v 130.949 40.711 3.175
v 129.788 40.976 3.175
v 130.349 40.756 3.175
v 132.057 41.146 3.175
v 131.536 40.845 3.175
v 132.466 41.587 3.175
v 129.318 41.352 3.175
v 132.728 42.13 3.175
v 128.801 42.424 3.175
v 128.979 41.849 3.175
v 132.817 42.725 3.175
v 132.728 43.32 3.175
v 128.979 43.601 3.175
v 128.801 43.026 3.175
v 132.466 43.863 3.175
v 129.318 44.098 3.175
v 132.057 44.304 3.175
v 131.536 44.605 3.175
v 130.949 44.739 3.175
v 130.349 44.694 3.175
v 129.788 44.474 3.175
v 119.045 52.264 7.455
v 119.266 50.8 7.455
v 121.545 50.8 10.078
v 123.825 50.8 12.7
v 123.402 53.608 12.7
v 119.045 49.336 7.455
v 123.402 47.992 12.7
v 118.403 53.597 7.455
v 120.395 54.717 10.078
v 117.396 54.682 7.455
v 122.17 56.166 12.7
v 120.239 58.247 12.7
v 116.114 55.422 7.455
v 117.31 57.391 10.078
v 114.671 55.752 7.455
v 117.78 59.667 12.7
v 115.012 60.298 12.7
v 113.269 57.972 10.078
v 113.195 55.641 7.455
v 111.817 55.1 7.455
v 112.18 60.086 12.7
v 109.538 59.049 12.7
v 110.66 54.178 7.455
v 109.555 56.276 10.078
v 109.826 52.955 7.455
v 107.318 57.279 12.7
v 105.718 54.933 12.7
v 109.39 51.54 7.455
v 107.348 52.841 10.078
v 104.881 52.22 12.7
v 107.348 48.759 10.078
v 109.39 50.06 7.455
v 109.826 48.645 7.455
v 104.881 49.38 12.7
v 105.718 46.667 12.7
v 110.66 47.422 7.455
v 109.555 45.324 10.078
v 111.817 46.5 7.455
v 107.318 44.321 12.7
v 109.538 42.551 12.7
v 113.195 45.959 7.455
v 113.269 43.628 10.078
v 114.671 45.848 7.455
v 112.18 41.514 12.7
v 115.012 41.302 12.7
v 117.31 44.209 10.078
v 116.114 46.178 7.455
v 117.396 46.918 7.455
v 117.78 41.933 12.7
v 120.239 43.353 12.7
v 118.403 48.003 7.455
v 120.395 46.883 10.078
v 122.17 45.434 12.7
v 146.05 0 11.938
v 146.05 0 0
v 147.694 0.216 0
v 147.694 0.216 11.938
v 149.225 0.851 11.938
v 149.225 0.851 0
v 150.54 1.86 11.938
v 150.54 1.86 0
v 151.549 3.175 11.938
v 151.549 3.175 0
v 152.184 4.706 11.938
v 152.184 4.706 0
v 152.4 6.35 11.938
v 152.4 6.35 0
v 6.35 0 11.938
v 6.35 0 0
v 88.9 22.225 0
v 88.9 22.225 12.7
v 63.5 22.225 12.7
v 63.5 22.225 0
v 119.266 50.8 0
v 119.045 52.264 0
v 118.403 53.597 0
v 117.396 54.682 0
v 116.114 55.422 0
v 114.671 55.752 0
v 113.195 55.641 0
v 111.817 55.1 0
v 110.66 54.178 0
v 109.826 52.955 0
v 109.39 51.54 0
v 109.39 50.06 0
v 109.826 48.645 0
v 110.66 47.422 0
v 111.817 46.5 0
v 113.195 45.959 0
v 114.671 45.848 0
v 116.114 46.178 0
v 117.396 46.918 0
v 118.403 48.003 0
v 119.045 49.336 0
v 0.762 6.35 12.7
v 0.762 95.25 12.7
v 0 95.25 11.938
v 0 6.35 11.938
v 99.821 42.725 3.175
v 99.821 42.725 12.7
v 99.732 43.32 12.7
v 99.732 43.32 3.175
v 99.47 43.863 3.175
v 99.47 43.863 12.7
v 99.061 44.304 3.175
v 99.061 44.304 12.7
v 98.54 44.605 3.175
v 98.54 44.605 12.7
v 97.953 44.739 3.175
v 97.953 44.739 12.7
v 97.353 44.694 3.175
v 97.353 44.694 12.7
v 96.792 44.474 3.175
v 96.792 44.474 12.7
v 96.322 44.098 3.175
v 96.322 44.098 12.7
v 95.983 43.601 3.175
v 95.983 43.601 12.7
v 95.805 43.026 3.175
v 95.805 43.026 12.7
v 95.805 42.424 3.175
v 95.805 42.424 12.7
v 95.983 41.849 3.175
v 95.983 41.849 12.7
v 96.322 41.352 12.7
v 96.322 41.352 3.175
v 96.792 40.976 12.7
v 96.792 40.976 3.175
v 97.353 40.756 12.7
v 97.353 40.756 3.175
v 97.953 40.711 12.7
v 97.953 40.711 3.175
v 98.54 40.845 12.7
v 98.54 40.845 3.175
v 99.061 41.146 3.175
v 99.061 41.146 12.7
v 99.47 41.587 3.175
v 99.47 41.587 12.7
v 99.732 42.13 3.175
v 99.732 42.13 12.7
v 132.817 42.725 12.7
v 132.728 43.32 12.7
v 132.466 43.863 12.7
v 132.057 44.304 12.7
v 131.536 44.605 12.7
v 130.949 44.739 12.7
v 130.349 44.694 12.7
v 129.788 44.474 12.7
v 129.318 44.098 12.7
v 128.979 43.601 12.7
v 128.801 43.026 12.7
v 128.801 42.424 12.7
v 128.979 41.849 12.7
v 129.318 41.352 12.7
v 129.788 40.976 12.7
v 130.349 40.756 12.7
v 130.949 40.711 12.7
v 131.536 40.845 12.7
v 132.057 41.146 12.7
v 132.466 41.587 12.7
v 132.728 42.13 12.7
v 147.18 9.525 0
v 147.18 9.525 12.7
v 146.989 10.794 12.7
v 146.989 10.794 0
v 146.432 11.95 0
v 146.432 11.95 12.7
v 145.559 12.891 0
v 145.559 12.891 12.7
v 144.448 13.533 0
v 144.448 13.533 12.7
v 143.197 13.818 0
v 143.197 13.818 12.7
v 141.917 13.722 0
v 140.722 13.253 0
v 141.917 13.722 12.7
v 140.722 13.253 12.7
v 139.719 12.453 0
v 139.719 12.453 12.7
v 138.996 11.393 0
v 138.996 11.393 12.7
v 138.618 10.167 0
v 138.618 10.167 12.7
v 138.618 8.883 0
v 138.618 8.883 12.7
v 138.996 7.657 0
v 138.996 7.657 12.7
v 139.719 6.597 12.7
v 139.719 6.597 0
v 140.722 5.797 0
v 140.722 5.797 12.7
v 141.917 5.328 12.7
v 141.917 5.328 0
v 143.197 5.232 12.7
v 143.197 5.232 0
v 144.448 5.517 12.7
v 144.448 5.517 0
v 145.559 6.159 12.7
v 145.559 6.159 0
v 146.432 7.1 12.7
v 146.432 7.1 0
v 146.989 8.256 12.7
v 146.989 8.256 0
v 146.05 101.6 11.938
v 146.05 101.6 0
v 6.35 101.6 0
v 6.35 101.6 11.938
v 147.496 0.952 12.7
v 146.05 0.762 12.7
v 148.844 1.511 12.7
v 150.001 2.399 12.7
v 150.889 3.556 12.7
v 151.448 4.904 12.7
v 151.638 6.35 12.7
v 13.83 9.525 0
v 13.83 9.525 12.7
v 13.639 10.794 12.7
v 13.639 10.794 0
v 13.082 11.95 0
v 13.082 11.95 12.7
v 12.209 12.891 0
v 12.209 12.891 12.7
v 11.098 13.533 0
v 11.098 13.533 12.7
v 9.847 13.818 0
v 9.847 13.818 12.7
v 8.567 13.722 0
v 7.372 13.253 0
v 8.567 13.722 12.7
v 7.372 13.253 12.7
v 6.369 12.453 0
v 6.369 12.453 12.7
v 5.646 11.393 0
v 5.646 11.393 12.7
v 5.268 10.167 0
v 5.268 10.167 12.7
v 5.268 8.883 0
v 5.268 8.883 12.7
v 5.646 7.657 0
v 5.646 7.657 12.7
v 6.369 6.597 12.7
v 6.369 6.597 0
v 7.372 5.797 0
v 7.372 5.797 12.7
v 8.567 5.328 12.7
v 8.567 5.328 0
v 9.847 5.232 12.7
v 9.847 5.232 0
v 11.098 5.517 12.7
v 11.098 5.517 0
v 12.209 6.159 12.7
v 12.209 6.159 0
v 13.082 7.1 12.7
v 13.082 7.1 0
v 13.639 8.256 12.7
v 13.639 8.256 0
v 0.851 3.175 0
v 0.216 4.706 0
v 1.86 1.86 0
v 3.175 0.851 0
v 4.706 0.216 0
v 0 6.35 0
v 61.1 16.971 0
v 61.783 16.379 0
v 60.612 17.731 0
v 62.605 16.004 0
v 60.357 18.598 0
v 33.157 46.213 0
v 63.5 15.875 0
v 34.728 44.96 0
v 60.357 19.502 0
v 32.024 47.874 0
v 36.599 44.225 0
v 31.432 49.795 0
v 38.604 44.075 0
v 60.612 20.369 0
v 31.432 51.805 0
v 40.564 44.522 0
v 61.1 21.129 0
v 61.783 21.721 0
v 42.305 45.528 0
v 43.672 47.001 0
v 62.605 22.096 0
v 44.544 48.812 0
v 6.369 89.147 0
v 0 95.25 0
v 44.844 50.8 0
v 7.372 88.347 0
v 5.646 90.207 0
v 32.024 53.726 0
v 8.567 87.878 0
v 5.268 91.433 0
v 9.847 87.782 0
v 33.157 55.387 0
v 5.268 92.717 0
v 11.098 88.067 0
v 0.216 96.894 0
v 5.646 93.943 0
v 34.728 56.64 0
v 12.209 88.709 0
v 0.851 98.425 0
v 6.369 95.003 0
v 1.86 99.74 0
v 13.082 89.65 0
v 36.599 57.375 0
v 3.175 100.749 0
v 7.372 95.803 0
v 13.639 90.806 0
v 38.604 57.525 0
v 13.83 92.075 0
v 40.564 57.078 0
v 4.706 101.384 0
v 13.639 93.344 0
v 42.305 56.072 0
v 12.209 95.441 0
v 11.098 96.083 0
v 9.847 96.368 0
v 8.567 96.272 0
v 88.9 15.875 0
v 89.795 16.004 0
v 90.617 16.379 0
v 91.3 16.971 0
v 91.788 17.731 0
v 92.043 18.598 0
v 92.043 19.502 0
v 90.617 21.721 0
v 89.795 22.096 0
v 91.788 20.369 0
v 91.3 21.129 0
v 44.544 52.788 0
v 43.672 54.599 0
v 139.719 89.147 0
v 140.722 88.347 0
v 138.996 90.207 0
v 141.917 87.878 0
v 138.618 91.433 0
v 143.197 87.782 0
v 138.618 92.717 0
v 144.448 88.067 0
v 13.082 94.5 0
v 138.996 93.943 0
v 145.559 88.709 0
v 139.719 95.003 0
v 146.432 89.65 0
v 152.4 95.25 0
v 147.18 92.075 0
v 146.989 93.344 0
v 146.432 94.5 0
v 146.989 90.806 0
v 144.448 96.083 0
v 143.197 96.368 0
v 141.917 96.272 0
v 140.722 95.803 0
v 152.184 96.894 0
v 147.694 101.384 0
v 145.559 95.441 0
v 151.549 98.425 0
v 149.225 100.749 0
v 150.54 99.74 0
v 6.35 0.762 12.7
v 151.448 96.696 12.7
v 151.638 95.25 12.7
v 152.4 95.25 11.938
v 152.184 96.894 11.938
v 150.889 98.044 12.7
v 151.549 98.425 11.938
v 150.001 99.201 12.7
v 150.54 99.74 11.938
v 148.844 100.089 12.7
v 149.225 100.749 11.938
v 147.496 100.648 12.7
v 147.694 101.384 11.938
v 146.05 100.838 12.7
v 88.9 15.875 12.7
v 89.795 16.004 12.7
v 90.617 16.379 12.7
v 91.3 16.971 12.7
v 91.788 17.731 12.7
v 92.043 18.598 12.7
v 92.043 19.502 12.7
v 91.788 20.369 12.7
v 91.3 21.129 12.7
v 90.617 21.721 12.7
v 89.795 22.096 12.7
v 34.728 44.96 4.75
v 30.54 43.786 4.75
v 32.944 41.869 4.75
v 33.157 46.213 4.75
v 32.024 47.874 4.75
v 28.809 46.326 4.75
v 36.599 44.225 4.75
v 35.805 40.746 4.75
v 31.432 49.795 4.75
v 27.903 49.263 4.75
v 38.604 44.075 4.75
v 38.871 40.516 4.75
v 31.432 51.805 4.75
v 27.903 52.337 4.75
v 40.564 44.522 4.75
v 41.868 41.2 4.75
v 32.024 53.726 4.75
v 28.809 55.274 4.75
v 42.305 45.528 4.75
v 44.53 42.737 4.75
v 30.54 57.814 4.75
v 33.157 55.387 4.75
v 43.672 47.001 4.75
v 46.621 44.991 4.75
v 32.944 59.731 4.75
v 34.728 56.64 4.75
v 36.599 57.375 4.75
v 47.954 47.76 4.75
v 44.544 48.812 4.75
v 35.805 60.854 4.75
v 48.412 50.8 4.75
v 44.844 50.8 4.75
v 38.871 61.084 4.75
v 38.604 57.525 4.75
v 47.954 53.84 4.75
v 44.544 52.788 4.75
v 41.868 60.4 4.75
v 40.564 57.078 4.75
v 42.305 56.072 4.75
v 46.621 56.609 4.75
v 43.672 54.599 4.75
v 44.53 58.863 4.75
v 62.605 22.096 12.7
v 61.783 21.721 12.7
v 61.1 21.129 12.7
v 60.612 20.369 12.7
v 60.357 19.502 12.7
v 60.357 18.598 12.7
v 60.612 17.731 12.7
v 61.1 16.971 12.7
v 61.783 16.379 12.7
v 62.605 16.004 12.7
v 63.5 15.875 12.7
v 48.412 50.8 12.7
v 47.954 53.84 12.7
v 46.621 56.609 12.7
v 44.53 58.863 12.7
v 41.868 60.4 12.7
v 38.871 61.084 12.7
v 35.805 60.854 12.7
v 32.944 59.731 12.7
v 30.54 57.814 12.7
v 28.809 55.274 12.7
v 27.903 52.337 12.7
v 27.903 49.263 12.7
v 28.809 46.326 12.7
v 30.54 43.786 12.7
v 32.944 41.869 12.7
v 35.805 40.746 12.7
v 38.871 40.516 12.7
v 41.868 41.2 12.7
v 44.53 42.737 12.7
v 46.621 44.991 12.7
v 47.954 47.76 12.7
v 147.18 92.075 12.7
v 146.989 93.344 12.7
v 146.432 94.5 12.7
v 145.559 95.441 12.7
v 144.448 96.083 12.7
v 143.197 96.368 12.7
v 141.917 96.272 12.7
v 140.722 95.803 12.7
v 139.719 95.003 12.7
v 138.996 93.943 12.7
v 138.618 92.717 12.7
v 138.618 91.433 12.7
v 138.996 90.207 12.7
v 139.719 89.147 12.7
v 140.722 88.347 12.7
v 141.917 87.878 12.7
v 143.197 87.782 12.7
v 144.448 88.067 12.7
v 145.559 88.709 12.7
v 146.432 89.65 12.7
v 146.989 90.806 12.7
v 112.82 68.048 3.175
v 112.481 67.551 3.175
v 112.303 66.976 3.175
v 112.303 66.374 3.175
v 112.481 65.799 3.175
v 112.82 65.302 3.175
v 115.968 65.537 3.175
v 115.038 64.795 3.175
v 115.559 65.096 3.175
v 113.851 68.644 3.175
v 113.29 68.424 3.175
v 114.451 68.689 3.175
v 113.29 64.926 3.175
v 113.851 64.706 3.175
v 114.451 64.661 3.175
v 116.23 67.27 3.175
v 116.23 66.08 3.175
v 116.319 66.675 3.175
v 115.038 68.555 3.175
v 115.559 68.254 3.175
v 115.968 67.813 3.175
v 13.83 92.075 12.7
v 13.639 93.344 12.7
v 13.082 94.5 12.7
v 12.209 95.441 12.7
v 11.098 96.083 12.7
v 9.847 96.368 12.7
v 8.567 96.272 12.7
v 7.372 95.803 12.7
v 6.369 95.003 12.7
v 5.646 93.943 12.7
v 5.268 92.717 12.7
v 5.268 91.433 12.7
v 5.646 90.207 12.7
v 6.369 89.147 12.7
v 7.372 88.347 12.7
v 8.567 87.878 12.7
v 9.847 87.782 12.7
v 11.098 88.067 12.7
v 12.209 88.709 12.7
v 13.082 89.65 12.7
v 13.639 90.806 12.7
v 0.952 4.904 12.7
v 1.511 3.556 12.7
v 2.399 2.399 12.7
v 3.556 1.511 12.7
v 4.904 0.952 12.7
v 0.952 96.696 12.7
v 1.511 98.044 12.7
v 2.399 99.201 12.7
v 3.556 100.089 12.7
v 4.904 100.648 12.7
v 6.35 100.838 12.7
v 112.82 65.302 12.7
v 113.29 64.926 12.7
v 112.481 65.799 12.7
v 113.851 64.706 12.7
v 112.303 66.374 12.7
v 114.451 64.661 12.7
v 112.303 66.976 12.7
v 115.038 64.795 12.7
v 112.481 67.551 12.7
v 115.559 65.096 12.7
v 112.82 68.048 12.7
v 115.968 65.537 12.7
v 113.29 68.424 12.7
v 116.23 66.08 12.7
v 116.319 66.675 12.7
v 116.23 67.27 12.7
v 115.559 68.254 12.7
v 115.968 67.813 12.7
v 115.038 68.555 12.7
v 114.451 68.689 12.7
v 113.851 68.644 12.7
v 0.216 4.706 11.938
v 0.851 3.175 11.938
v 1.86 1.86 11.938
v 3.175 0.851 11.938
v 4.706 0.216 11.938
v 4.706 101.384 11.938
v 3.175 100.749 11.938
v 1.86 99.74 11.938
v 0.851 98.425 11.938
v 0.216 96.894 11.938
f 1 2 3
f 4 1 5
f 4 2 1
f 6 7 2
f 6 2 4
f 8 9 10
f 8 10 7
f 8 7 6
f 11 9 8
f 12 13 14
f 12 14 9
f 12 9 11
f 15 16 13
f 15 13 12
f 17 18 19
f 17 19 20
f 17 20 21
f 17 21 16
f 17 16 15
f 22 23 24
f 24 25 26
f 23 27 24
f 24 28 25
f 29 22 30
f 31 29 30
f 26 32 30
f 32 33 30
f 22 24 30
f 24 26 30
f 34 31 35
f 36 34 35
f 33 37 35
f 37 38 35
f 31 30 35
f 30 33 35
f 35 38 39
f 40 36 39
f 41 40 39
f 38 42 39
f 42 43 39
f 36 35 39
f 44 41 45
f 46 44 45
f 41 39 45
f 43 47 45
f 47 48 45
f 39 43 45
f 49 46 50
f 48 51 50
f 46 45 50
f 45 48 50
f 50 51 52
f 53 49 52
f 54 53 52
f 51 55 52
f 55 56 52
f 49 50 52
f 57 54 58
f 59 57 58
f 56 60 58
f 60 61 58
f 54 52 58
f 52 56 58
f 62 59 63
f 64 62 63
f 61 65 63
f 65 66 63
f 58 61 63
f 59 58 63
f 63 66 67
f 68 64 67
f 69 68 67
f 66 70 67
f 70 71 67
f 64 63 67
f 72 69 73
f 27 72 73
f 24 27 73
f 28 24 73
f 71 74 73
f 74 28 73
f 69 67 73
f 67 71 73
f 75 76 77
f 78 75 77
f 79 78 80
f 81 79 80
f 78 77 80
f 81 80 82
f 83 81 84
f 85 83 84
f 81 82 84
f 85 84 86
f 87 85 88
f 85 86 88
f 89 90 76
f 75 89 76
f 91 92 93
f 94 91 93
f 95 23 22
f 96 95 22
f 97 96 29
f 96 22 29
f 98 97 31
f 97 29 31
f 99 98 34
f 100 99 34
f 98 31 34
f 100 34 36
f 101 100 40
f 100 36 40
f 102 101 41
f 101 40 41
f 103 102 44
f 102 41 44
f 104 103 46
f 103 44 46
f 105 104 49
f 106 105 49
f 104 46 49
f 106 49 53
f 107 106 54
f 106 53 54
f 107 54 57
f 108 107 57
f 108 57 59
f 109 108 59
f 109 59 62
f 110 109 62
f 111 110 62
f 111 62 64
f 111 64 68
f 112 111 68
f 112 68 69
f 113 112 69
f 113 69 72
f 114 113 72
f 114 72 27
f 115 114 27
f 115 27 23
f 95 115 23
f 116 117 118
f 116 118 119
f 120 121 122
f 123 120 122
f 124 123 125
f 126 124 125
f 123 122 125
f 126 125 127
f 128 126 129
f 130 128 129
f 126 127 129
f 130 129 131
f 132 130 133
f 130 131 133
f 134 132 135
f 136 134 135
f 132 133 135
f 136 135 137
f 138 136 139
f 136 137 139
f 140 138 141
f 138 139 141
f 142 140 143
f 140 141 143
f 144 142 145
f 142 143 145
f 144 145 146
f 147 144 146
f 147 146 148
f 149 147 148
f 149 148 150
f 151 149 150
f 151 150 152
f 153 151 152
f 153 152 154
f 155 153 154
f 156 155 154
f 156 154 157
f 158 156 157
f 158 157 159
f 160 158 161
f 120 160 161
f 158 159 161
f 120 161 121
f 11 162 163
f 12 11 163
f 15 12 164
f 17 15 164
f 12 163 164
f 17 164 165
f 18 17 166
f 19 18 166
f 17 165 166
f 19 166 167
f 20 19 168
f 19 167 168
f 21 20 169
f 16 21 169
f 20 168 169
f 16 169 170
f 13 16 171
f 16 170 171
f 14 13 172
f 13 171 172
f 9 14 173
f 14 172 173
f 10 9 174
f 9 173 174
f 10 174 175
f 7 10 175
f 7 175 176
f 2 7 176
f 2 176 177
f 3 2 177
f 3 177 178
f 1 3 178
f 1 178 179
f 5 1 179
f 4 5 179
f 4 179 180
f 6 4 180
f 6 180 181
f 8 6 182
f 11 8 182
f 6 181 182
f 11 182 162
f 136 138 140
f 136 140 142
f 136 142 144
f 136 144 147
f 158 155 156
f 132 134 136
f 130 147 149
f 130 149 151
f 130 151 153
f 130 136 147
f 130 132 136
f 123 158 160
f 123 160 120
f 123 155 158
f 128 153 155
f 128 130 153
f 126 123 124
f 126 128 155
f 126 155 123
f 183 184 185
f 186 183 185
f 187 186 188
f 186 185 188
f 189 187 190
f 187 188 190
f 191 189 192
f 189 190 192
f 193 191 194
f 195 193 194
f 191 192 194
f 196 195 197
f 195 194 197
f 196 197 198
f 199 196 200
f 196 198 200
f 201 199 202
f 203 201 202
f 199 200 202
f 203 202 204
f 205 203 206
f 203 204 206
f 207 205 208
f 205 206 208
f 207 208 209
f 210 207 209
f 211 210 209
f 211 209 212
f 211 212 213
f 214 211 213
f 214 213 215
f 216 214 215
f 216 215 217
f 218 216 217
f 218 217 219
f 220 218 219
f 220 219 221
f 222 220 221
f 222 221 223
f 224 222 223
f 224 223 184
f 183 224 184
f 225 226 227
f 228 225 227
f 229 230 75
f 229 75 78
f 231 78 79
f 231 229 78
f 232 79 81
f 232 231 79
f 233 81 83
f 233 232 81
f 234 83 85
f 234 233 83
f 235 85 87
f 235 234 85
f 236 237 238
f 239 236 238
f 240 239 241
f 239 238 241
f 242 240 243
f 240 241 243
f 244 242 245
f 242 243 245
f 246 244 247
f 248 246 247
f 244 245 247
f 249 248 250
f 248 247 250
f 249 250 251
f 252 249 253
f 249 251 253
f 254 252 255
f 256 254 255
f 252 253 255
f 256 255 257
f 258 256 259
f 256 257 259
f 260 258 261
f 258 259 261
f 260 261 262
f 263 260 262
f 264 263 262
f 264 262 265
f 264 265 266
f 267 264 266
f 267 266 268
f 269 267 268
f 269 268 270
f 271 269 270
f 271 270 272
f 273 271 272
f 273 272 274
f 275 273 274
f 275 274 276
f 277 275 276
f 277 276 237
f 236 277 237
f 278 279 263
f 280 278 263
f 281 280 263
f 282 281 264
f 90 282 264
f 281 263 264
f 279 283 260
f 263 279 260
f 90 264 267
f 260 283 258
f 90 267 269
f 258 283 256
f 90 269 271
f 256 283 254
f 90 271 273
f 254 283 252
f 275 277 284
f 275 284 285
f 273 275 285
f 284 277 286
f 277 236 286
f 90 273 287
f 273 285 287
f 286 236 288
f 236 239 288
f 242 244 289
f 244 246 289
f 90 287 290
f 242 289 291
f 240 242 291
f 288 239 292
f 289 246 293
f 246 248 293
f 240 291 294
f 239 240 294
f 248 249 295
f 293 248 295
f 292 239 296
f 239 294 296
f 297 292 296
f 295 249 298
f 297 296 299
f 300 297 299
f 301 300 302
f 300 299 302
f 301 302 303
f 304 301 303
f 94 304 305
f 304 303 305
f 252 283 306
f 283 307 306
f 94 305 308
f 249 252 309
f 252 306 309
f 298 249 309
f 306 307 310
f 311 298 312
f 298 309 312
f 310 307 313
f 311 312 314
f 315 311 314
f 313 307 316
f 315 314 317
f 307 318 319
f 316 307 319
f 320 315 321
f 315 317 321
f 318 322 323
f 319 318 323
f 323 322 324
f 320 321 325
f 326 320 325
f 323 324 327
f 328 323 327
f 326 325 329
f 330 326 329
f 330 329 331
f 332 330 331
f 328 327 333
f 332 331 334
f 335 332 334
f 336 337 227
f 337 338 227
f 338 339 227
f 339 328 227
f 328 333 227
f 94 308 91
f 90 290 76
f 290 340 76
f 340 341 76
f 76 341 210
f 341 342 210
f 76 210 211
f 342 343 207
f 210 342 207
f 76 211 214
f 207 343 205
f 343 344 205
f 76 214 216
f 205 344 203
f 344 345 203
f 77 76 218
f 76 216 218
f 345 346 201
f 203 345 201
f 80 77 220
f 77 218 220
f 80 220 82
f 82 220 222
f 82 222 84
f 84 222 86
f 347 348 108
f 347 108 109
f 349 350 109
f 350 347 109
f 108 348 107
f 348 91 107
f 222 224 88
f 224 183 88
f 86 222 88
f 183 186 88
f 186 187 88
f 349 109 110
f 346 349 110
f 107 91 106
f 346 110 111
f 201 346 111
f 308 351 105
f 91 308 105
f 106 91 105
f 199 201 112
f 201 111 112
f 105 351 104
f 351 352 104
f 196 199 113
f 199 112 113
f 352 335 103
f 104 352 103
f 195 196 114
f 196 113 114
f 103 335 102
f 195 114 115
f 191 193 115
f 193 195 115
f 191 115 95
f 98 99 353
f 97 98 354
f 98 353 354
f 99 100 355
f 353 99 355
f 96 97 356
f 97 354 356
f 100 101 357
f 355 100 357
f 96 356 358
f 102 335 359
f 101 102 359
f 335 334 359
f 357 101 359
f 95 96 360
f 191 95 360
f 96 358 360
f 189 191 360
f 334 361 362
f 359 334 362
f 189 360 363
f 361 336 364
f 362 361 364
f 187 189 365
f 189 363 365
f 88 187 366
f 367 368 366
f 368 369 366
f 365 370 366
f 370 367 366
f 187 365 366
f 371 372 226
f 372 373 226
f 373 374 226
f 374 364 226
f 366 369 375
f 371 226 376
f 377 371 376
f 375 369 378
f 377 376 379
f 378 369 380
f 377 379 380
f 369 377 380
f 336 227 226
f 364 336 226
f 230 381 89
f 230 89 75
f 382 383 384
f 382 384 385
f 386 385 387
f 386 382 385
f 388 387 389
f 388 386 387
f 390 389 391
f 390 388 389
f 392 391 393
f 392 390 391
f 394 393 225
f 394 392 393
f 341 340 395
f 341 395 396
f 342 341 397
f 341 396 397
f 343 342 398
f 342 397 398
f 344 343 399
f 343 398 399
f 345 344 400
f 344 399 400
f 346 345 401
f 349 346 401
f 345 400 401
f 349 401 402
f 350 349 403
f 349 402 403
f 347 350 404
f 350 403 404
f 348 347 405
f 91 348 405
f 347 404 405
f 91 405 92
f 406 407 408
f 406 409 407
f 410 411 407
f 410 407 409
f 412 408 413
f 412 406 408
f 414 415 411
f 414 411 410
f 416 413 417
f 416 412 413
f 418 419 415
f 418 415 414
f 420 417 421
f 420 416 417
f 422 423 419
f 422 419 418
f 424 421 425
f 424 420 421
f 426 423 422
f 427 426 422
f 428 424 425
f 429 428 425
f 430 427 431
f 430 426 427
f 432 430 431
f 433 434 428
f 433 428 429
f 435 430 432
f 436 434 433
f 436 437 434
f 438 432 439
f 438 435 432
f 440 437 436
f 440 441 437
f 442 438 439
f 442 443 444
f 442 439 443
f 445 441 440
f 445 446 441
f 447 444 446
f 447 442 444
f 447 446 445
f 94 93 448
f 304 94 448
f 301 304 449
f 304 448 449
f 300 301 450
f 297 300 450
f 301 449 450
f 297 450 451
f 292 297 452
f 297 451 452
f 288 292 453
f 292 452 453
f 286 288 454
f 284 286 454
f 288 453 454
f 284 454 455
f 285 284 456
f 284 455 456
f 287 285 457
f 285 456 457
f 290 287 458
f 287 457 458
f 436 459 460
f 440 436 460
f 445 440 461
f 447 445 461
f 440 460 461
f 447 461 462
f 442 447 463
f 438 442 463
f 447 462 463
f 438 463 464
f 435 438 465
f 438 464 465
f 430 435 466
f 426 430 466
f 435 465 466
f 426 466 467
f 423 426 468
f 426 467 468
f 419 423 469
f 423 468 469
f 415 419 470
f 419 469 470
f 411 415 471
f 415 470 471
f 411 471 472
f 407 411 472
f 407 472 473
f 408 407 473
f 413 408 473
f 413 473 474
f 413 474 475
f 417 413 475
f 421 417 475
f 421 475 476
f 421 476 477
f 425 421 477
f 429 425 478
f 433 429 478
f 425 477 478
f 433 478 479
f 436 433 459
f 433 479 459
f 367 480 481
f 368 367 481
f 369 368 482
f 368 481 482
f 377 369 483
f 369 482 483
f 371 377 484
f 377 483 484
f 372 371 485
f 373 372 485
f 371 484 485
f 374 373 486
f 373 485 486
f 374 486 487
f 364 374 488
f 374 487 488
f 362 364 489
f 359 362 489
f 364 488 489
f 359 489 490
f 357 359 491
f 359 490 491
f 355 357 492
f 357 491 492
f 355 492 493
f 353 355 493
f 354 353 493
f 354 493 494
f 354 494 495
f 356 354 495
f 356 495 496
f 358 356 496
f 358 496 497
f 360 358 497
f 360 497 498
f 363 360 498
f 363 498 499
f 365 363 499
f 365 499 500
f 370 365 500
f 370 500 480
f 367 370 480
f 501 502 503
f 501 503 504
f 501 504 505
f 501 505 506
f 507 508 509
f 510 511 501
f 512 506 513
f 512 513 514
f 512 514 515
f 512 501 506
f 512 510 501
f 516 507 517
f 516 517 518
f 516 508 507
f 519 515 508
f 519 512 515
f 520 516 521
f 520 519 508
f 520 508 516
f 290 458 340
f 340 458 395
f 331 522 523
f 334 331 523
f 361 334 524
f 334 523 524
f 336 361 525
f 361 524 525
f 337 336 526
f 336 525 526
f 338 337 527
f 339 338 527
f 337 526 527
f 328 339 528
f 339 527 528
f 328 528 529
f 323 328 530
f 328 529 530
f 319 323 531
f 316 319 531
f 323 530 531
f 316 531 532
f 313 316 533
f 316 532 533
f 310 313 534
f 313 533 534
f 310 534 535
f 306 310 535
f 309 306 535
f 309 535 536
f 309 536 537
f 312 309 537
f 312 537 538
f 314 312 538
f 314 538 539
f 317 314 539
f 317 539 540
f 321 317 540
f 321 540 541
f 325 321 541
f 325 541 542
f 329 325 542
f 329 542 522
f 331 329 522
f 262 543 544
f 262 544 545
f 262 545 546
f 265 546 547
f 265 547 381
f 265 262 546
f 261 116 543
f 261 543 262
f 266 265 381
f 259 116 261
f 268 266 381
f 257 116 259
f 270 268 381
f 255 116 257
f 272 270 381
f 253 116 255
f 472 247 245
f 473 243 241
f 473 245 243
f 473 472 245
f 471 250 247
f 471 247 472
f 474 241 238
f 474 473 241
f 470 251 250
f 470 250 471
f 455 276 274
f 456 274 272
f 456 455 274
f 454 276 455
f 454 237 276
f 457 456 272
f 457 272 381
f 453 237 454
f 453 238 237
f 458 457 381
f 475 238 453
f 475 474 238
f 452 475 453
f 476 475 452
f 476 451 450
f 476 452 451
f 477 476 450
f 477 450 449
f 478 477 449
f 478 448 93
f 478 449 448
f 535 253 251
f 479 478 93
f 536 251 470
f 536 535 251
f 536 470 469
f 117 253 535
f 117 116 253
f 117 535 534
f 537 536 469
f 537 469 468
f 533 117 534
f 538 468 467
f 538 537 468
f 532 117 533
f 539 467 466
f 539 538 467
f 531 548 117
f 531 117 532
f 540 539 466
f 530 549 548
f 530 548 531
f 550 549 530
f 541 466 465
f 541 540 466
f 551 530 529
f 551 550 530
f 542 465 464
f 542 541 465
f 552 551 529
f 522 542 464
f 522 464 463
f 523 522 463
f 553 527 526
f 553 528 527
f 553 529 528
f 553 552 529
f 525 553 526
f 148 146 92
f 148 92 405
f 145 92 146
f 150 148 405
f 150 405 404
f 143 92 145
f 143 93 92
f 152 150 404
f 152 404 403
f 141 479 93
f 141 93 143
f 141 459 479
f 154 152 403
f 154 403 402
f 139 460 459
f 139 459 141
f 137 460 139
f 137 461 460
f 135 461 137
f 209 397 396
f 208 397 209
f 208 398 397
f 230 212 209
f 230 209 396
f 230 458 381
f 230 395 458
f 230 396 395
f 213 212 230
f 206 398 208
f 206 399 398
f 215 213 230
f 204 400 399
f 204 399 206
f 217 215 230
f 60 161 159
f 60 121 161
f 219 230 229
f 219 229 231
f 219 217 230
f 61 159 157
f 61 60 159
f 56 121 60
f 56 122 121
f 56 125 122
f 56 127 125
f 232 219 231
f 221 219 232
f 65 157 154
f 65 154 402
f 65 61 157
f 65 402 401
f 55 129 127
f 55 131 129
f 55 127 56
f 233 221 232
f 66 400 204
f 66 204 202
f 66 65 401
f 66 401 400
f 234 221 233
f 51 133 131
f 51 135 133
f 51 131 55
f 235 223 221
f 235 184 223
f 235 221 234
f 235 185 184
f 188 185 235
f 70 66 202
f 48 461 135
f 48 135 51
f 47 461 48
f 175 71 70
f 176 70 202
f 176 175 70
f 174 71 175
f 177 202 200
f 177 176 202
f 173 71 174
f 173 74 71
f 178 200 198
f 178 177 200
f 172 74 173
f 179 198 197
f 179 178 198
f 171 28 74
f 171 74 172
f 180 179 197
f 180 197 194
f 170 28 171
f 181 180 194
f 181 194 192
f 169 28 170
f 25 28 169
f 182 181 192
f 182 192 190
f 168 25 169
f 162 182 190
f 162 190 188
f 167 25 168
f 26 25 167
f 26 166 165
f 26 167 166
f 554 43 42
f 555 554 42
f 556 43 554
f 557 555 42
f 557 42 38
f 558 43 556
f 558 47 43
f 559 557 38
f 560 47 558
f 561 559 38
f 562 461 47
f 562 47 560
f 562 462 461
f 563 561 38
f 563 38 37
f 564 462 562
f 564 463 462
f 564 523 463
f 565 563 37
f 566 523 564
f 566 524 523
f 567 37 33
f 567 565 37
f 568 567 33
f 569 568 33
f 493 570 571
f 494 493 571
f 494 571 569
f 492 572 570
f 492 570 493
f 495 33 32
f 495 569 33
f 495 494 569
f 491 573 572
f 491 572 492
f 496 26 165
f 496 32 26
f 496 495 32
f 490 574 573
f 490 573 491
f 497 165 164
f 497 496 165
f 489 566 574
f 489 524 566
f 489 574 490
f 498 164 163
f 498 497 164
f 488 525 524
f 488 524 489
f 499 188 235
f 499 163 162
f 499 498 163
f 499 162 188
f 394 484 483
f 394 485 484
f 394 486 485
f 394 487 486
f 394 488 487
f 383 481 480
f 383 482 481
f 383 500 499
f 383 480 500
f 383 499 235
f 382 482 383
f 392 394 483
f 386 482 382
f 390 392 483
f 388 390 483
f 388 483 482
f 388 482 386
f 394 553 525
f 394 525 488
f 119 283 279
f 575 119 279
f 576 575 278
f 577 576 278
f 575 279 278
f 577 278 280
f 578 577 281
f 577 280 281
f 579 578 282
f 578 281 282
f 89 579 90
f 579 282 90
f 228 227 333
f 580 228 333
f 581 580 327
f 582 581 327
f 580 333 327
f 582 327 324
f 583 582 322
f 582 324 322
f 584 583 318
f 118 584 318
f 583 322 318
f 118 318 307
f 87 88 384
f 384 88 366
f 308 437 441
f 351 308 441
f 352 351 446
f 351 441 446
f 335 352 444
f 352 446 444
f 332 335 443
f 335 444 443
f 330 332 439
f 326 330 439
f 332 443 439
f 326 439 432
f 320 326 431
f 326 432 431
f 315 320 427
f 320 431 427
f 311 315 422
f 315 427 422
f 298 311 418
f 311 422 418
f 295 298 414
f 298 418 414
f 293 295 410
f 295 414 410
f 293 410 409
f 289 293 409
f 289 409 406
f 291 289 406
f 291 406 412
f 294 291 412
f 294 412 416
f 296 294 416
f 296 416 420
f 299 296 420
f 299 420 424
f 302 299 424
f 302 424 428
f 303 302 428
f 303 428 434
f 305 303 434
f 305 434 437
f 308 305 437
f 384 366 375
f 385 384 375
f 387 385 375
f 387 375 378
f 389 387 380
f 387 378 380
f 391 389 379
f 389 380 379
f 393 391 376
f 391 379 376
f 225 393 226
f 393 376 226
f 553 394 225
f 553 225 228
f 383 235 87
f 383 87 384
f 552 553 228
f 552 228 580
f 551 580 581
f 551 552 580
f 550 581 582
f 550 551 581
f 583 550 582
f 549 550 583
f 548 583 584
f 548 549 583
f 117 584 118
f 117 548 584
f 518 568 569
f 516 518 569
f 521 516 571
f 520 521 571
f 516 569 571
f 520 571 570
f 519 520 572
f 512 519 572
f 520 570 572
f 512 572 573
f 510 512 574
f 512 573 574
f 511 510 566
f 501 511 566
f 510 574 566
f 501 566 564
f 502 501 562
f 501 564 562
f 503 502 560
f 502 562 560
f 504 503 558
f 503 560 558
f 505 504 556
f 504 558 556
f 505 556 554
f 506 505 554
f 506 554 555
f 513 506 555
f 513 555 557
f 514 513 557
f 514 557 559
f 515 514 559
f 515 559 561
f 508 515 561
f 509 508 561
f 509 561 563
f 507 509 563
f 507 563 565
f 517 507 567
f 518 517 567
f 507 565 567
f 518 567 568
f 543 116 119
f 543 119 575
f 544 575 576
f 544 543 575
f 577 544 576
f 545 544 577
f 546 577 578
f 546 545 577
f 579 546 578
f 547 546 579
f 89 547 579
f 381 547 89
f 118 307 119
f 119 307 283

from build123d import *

# Parameters (mm, degrees)
EXTRUDE_1_DEPTH     = 12.7
SKETCH_2_R          = 4.3053
CUT_EXTRUDE_1_DEPTH = 184.601770144
CUT_EXTRUDE_2_DEPTH = 184.601770144
SKETCH_4_R          = 10.3124
CUT_EXTRUDE_3_DEPTH = 7.9502
SKETCH_5_R          = 6.7437
CUT_EXTRUDE_4_DEPTH = 184.601770144
SKETCH_6_R          = 9.525
CUT_EXTRUDE_5_DEPTH = 5.244874679
CUT_EXTRUDE_5_DRAFT = -41
SKETCH_7_R          = 4.9657
CUT_EXTRUDE_6_DEPTH = 184.601770144
SKETCH_8_R          = 2.0193
CUT_EXTRUDE_7_DEPTH = 9.525
CHAMFER_1_SIZE      = 0.762


with BuildPart() as part:
    # 草图1 → 凸台-拉伸1 (new body)
    with BuildSketch(Plane.XY):
        with BuildLine():
            Line((6.35, 0), (146.05, 0))
            ThreePointArc((146.05, 0), (150.540128061, 1.859871939), (152.4, 6.35))
            Line((152.4, 6.35), (152.4, 95.25))
            ThreePointArc((152.4, 95.25), (150.540128061, 99.740128061), (146.05, 101.6))
            Line((146.05, 101.6), (6.35, 101.6))
            ThreePointArc((6.35, 101.6), (1.859871939, 99.740128061), (0, 95.25))
            Line((0, 95.25), (0, 6.35))
            ThreePointArc((0, 6.35), (1.859871939, 1.859871939), (6.35, 0))
        make_face()
    extrude(amount=EXTRUDE_1_DEPTH)

    # 草图2 → 切除-拉伸1 (cut, through all)
    with BuildSketch(Plane.XY.offset(12.7)):
        with Locations((9.525, 9.525)):
            Circle(SKETCH_2_R)
        with Locations((142.875, 9.525)):
            Circle(SKETCH_2_R)
        with Locations((9.525, 92.075)):
            Circle(SKETCH_2_R)
        with Locations((142.875, 92.075)):
            Circle(SKETCH_2_R)
    extrude(amount=-CUT_EXTRUDE_1_DEPTH, mode=Mode.SUBTRACT)

    # 草图3 → 切除-拉伸2 (cut, through all)
    with BuildSketch(Plane.XY.offset(12.7)):
        with BuildLine():
            Line((63.5, 15.875), (88.9, 15.875))
            ThreePointArc((88.9, 15.875), (92.075, 19.05), (88.9, 22.225))
            Line((88.9, 22.225), (63.5, 22.225))
            ThreePointArc((63.5, 22.225), (60.325, 19.05), (63.5, 15.875))
        make_face()
    extrude(amount=-CUT_EXTRUDE_2_DEPTH, mode=Mode.SUBTRACT)

    # 草图4 → 切除-拉伸3 (cut)
    with BuildSketch(Plane.XY.offset(12.7)):
        with Locations((38.1, 50.8)):
            Circle(SKETCH_4_R)
    extrude(amount=-CUT_EXTRUDE_3_DEPTH, mode=Mode.SUBTRACT)

    # 草图5 → 切除-拉伸4 (cut, through all)
    with BuildSketch(Plane.XY.offset(12.7)):
        with Locations((38.1, 50.8)):
            Circle(SKETCH_5_R)
    extrude(amount=-CUT_EXTRUDE_4_DEPTH, mode=Mode.SUBTRACT)


with BuildPart() as cut_extrude_5_tool:
    # 草图6 → 切除-拉伸5 (with draft: the straight prism first)
    with BuildSketch(Plane.XY.offset(12.7)):
        with Locations((114.3, 50.8)):
            Circle(SKETCH_6_R)
    extrude(amount=-CUT_EXTRUDE_5_DEPTH)
    # 切除-拉伸5: the draft: its side faces are tilted about the plane it starts from
    cut_extrude_5_sides = [cut_extrude_5_tool.faces().sort_by_distance(p)[0] for p in [
        (104.775, 50.8, 10.07756266),
    ]]
    draft(cut_extrude_5_sides, Plane.XY.offset(12.7), CUT_EXTRUDE_5_DRAFT)


with BuildPart() as part_1:
    add(part.part)

    # 切除-拉伸5: cut by cut_extrude_5_tool
    add(cut_extrude_5_tool.part, mode=Mode.SUBTRACT)

    # 草图7 → 切除-拉伸6 (cut, through all)
    with BuildSketch(Plane.XY.offset(12.7)):
        with Locations((114.3, 50.8)):
            Circle(SKETCH_7_R)
    extrude(amount=-CUT_EXTRUDE_6_DEPTH, mode=Mode.SUBTRACT)

    # 草图8 → 切除-拉伸7 (cut)
    with BuildSketch(Plane.XY.offset(12.7)):
        with Locations((114.3, 66.675)):
            Circle(SKETCH_8_R)
        with Locations((97.802, 42.725)):
            Circle(SKETCH_8_R)
        with Locations((130.798, 42.725)):
            Circle(SKETCH_8_R)
    extrude(amount=-CUT_EXTRUDE_7_DEPTH, mode=Mode.SUBTRACT)

    # 倒角1
    chamfer_1_edges = [part_1.edges().sort_by_distance(p)[0] for p in [
        (150.540128061, 1.859871939, 12.7),
        (152.4, 50.8, 12.7),
        (150.540128061, 99.740128061, 12.7),
        (76.2, 101.6, 12.7),
        (1.859871939, 99.740128061, 12.7),
        (0, 50.8, 12.7),
        (1.859871939, 1.859871939, 12.7),
        (76.2, 0, 12.7),
    ]]
    chamfer(chamfer_1_edges, length=CHAMFER_1_SIZE)


solid = part_1.part
